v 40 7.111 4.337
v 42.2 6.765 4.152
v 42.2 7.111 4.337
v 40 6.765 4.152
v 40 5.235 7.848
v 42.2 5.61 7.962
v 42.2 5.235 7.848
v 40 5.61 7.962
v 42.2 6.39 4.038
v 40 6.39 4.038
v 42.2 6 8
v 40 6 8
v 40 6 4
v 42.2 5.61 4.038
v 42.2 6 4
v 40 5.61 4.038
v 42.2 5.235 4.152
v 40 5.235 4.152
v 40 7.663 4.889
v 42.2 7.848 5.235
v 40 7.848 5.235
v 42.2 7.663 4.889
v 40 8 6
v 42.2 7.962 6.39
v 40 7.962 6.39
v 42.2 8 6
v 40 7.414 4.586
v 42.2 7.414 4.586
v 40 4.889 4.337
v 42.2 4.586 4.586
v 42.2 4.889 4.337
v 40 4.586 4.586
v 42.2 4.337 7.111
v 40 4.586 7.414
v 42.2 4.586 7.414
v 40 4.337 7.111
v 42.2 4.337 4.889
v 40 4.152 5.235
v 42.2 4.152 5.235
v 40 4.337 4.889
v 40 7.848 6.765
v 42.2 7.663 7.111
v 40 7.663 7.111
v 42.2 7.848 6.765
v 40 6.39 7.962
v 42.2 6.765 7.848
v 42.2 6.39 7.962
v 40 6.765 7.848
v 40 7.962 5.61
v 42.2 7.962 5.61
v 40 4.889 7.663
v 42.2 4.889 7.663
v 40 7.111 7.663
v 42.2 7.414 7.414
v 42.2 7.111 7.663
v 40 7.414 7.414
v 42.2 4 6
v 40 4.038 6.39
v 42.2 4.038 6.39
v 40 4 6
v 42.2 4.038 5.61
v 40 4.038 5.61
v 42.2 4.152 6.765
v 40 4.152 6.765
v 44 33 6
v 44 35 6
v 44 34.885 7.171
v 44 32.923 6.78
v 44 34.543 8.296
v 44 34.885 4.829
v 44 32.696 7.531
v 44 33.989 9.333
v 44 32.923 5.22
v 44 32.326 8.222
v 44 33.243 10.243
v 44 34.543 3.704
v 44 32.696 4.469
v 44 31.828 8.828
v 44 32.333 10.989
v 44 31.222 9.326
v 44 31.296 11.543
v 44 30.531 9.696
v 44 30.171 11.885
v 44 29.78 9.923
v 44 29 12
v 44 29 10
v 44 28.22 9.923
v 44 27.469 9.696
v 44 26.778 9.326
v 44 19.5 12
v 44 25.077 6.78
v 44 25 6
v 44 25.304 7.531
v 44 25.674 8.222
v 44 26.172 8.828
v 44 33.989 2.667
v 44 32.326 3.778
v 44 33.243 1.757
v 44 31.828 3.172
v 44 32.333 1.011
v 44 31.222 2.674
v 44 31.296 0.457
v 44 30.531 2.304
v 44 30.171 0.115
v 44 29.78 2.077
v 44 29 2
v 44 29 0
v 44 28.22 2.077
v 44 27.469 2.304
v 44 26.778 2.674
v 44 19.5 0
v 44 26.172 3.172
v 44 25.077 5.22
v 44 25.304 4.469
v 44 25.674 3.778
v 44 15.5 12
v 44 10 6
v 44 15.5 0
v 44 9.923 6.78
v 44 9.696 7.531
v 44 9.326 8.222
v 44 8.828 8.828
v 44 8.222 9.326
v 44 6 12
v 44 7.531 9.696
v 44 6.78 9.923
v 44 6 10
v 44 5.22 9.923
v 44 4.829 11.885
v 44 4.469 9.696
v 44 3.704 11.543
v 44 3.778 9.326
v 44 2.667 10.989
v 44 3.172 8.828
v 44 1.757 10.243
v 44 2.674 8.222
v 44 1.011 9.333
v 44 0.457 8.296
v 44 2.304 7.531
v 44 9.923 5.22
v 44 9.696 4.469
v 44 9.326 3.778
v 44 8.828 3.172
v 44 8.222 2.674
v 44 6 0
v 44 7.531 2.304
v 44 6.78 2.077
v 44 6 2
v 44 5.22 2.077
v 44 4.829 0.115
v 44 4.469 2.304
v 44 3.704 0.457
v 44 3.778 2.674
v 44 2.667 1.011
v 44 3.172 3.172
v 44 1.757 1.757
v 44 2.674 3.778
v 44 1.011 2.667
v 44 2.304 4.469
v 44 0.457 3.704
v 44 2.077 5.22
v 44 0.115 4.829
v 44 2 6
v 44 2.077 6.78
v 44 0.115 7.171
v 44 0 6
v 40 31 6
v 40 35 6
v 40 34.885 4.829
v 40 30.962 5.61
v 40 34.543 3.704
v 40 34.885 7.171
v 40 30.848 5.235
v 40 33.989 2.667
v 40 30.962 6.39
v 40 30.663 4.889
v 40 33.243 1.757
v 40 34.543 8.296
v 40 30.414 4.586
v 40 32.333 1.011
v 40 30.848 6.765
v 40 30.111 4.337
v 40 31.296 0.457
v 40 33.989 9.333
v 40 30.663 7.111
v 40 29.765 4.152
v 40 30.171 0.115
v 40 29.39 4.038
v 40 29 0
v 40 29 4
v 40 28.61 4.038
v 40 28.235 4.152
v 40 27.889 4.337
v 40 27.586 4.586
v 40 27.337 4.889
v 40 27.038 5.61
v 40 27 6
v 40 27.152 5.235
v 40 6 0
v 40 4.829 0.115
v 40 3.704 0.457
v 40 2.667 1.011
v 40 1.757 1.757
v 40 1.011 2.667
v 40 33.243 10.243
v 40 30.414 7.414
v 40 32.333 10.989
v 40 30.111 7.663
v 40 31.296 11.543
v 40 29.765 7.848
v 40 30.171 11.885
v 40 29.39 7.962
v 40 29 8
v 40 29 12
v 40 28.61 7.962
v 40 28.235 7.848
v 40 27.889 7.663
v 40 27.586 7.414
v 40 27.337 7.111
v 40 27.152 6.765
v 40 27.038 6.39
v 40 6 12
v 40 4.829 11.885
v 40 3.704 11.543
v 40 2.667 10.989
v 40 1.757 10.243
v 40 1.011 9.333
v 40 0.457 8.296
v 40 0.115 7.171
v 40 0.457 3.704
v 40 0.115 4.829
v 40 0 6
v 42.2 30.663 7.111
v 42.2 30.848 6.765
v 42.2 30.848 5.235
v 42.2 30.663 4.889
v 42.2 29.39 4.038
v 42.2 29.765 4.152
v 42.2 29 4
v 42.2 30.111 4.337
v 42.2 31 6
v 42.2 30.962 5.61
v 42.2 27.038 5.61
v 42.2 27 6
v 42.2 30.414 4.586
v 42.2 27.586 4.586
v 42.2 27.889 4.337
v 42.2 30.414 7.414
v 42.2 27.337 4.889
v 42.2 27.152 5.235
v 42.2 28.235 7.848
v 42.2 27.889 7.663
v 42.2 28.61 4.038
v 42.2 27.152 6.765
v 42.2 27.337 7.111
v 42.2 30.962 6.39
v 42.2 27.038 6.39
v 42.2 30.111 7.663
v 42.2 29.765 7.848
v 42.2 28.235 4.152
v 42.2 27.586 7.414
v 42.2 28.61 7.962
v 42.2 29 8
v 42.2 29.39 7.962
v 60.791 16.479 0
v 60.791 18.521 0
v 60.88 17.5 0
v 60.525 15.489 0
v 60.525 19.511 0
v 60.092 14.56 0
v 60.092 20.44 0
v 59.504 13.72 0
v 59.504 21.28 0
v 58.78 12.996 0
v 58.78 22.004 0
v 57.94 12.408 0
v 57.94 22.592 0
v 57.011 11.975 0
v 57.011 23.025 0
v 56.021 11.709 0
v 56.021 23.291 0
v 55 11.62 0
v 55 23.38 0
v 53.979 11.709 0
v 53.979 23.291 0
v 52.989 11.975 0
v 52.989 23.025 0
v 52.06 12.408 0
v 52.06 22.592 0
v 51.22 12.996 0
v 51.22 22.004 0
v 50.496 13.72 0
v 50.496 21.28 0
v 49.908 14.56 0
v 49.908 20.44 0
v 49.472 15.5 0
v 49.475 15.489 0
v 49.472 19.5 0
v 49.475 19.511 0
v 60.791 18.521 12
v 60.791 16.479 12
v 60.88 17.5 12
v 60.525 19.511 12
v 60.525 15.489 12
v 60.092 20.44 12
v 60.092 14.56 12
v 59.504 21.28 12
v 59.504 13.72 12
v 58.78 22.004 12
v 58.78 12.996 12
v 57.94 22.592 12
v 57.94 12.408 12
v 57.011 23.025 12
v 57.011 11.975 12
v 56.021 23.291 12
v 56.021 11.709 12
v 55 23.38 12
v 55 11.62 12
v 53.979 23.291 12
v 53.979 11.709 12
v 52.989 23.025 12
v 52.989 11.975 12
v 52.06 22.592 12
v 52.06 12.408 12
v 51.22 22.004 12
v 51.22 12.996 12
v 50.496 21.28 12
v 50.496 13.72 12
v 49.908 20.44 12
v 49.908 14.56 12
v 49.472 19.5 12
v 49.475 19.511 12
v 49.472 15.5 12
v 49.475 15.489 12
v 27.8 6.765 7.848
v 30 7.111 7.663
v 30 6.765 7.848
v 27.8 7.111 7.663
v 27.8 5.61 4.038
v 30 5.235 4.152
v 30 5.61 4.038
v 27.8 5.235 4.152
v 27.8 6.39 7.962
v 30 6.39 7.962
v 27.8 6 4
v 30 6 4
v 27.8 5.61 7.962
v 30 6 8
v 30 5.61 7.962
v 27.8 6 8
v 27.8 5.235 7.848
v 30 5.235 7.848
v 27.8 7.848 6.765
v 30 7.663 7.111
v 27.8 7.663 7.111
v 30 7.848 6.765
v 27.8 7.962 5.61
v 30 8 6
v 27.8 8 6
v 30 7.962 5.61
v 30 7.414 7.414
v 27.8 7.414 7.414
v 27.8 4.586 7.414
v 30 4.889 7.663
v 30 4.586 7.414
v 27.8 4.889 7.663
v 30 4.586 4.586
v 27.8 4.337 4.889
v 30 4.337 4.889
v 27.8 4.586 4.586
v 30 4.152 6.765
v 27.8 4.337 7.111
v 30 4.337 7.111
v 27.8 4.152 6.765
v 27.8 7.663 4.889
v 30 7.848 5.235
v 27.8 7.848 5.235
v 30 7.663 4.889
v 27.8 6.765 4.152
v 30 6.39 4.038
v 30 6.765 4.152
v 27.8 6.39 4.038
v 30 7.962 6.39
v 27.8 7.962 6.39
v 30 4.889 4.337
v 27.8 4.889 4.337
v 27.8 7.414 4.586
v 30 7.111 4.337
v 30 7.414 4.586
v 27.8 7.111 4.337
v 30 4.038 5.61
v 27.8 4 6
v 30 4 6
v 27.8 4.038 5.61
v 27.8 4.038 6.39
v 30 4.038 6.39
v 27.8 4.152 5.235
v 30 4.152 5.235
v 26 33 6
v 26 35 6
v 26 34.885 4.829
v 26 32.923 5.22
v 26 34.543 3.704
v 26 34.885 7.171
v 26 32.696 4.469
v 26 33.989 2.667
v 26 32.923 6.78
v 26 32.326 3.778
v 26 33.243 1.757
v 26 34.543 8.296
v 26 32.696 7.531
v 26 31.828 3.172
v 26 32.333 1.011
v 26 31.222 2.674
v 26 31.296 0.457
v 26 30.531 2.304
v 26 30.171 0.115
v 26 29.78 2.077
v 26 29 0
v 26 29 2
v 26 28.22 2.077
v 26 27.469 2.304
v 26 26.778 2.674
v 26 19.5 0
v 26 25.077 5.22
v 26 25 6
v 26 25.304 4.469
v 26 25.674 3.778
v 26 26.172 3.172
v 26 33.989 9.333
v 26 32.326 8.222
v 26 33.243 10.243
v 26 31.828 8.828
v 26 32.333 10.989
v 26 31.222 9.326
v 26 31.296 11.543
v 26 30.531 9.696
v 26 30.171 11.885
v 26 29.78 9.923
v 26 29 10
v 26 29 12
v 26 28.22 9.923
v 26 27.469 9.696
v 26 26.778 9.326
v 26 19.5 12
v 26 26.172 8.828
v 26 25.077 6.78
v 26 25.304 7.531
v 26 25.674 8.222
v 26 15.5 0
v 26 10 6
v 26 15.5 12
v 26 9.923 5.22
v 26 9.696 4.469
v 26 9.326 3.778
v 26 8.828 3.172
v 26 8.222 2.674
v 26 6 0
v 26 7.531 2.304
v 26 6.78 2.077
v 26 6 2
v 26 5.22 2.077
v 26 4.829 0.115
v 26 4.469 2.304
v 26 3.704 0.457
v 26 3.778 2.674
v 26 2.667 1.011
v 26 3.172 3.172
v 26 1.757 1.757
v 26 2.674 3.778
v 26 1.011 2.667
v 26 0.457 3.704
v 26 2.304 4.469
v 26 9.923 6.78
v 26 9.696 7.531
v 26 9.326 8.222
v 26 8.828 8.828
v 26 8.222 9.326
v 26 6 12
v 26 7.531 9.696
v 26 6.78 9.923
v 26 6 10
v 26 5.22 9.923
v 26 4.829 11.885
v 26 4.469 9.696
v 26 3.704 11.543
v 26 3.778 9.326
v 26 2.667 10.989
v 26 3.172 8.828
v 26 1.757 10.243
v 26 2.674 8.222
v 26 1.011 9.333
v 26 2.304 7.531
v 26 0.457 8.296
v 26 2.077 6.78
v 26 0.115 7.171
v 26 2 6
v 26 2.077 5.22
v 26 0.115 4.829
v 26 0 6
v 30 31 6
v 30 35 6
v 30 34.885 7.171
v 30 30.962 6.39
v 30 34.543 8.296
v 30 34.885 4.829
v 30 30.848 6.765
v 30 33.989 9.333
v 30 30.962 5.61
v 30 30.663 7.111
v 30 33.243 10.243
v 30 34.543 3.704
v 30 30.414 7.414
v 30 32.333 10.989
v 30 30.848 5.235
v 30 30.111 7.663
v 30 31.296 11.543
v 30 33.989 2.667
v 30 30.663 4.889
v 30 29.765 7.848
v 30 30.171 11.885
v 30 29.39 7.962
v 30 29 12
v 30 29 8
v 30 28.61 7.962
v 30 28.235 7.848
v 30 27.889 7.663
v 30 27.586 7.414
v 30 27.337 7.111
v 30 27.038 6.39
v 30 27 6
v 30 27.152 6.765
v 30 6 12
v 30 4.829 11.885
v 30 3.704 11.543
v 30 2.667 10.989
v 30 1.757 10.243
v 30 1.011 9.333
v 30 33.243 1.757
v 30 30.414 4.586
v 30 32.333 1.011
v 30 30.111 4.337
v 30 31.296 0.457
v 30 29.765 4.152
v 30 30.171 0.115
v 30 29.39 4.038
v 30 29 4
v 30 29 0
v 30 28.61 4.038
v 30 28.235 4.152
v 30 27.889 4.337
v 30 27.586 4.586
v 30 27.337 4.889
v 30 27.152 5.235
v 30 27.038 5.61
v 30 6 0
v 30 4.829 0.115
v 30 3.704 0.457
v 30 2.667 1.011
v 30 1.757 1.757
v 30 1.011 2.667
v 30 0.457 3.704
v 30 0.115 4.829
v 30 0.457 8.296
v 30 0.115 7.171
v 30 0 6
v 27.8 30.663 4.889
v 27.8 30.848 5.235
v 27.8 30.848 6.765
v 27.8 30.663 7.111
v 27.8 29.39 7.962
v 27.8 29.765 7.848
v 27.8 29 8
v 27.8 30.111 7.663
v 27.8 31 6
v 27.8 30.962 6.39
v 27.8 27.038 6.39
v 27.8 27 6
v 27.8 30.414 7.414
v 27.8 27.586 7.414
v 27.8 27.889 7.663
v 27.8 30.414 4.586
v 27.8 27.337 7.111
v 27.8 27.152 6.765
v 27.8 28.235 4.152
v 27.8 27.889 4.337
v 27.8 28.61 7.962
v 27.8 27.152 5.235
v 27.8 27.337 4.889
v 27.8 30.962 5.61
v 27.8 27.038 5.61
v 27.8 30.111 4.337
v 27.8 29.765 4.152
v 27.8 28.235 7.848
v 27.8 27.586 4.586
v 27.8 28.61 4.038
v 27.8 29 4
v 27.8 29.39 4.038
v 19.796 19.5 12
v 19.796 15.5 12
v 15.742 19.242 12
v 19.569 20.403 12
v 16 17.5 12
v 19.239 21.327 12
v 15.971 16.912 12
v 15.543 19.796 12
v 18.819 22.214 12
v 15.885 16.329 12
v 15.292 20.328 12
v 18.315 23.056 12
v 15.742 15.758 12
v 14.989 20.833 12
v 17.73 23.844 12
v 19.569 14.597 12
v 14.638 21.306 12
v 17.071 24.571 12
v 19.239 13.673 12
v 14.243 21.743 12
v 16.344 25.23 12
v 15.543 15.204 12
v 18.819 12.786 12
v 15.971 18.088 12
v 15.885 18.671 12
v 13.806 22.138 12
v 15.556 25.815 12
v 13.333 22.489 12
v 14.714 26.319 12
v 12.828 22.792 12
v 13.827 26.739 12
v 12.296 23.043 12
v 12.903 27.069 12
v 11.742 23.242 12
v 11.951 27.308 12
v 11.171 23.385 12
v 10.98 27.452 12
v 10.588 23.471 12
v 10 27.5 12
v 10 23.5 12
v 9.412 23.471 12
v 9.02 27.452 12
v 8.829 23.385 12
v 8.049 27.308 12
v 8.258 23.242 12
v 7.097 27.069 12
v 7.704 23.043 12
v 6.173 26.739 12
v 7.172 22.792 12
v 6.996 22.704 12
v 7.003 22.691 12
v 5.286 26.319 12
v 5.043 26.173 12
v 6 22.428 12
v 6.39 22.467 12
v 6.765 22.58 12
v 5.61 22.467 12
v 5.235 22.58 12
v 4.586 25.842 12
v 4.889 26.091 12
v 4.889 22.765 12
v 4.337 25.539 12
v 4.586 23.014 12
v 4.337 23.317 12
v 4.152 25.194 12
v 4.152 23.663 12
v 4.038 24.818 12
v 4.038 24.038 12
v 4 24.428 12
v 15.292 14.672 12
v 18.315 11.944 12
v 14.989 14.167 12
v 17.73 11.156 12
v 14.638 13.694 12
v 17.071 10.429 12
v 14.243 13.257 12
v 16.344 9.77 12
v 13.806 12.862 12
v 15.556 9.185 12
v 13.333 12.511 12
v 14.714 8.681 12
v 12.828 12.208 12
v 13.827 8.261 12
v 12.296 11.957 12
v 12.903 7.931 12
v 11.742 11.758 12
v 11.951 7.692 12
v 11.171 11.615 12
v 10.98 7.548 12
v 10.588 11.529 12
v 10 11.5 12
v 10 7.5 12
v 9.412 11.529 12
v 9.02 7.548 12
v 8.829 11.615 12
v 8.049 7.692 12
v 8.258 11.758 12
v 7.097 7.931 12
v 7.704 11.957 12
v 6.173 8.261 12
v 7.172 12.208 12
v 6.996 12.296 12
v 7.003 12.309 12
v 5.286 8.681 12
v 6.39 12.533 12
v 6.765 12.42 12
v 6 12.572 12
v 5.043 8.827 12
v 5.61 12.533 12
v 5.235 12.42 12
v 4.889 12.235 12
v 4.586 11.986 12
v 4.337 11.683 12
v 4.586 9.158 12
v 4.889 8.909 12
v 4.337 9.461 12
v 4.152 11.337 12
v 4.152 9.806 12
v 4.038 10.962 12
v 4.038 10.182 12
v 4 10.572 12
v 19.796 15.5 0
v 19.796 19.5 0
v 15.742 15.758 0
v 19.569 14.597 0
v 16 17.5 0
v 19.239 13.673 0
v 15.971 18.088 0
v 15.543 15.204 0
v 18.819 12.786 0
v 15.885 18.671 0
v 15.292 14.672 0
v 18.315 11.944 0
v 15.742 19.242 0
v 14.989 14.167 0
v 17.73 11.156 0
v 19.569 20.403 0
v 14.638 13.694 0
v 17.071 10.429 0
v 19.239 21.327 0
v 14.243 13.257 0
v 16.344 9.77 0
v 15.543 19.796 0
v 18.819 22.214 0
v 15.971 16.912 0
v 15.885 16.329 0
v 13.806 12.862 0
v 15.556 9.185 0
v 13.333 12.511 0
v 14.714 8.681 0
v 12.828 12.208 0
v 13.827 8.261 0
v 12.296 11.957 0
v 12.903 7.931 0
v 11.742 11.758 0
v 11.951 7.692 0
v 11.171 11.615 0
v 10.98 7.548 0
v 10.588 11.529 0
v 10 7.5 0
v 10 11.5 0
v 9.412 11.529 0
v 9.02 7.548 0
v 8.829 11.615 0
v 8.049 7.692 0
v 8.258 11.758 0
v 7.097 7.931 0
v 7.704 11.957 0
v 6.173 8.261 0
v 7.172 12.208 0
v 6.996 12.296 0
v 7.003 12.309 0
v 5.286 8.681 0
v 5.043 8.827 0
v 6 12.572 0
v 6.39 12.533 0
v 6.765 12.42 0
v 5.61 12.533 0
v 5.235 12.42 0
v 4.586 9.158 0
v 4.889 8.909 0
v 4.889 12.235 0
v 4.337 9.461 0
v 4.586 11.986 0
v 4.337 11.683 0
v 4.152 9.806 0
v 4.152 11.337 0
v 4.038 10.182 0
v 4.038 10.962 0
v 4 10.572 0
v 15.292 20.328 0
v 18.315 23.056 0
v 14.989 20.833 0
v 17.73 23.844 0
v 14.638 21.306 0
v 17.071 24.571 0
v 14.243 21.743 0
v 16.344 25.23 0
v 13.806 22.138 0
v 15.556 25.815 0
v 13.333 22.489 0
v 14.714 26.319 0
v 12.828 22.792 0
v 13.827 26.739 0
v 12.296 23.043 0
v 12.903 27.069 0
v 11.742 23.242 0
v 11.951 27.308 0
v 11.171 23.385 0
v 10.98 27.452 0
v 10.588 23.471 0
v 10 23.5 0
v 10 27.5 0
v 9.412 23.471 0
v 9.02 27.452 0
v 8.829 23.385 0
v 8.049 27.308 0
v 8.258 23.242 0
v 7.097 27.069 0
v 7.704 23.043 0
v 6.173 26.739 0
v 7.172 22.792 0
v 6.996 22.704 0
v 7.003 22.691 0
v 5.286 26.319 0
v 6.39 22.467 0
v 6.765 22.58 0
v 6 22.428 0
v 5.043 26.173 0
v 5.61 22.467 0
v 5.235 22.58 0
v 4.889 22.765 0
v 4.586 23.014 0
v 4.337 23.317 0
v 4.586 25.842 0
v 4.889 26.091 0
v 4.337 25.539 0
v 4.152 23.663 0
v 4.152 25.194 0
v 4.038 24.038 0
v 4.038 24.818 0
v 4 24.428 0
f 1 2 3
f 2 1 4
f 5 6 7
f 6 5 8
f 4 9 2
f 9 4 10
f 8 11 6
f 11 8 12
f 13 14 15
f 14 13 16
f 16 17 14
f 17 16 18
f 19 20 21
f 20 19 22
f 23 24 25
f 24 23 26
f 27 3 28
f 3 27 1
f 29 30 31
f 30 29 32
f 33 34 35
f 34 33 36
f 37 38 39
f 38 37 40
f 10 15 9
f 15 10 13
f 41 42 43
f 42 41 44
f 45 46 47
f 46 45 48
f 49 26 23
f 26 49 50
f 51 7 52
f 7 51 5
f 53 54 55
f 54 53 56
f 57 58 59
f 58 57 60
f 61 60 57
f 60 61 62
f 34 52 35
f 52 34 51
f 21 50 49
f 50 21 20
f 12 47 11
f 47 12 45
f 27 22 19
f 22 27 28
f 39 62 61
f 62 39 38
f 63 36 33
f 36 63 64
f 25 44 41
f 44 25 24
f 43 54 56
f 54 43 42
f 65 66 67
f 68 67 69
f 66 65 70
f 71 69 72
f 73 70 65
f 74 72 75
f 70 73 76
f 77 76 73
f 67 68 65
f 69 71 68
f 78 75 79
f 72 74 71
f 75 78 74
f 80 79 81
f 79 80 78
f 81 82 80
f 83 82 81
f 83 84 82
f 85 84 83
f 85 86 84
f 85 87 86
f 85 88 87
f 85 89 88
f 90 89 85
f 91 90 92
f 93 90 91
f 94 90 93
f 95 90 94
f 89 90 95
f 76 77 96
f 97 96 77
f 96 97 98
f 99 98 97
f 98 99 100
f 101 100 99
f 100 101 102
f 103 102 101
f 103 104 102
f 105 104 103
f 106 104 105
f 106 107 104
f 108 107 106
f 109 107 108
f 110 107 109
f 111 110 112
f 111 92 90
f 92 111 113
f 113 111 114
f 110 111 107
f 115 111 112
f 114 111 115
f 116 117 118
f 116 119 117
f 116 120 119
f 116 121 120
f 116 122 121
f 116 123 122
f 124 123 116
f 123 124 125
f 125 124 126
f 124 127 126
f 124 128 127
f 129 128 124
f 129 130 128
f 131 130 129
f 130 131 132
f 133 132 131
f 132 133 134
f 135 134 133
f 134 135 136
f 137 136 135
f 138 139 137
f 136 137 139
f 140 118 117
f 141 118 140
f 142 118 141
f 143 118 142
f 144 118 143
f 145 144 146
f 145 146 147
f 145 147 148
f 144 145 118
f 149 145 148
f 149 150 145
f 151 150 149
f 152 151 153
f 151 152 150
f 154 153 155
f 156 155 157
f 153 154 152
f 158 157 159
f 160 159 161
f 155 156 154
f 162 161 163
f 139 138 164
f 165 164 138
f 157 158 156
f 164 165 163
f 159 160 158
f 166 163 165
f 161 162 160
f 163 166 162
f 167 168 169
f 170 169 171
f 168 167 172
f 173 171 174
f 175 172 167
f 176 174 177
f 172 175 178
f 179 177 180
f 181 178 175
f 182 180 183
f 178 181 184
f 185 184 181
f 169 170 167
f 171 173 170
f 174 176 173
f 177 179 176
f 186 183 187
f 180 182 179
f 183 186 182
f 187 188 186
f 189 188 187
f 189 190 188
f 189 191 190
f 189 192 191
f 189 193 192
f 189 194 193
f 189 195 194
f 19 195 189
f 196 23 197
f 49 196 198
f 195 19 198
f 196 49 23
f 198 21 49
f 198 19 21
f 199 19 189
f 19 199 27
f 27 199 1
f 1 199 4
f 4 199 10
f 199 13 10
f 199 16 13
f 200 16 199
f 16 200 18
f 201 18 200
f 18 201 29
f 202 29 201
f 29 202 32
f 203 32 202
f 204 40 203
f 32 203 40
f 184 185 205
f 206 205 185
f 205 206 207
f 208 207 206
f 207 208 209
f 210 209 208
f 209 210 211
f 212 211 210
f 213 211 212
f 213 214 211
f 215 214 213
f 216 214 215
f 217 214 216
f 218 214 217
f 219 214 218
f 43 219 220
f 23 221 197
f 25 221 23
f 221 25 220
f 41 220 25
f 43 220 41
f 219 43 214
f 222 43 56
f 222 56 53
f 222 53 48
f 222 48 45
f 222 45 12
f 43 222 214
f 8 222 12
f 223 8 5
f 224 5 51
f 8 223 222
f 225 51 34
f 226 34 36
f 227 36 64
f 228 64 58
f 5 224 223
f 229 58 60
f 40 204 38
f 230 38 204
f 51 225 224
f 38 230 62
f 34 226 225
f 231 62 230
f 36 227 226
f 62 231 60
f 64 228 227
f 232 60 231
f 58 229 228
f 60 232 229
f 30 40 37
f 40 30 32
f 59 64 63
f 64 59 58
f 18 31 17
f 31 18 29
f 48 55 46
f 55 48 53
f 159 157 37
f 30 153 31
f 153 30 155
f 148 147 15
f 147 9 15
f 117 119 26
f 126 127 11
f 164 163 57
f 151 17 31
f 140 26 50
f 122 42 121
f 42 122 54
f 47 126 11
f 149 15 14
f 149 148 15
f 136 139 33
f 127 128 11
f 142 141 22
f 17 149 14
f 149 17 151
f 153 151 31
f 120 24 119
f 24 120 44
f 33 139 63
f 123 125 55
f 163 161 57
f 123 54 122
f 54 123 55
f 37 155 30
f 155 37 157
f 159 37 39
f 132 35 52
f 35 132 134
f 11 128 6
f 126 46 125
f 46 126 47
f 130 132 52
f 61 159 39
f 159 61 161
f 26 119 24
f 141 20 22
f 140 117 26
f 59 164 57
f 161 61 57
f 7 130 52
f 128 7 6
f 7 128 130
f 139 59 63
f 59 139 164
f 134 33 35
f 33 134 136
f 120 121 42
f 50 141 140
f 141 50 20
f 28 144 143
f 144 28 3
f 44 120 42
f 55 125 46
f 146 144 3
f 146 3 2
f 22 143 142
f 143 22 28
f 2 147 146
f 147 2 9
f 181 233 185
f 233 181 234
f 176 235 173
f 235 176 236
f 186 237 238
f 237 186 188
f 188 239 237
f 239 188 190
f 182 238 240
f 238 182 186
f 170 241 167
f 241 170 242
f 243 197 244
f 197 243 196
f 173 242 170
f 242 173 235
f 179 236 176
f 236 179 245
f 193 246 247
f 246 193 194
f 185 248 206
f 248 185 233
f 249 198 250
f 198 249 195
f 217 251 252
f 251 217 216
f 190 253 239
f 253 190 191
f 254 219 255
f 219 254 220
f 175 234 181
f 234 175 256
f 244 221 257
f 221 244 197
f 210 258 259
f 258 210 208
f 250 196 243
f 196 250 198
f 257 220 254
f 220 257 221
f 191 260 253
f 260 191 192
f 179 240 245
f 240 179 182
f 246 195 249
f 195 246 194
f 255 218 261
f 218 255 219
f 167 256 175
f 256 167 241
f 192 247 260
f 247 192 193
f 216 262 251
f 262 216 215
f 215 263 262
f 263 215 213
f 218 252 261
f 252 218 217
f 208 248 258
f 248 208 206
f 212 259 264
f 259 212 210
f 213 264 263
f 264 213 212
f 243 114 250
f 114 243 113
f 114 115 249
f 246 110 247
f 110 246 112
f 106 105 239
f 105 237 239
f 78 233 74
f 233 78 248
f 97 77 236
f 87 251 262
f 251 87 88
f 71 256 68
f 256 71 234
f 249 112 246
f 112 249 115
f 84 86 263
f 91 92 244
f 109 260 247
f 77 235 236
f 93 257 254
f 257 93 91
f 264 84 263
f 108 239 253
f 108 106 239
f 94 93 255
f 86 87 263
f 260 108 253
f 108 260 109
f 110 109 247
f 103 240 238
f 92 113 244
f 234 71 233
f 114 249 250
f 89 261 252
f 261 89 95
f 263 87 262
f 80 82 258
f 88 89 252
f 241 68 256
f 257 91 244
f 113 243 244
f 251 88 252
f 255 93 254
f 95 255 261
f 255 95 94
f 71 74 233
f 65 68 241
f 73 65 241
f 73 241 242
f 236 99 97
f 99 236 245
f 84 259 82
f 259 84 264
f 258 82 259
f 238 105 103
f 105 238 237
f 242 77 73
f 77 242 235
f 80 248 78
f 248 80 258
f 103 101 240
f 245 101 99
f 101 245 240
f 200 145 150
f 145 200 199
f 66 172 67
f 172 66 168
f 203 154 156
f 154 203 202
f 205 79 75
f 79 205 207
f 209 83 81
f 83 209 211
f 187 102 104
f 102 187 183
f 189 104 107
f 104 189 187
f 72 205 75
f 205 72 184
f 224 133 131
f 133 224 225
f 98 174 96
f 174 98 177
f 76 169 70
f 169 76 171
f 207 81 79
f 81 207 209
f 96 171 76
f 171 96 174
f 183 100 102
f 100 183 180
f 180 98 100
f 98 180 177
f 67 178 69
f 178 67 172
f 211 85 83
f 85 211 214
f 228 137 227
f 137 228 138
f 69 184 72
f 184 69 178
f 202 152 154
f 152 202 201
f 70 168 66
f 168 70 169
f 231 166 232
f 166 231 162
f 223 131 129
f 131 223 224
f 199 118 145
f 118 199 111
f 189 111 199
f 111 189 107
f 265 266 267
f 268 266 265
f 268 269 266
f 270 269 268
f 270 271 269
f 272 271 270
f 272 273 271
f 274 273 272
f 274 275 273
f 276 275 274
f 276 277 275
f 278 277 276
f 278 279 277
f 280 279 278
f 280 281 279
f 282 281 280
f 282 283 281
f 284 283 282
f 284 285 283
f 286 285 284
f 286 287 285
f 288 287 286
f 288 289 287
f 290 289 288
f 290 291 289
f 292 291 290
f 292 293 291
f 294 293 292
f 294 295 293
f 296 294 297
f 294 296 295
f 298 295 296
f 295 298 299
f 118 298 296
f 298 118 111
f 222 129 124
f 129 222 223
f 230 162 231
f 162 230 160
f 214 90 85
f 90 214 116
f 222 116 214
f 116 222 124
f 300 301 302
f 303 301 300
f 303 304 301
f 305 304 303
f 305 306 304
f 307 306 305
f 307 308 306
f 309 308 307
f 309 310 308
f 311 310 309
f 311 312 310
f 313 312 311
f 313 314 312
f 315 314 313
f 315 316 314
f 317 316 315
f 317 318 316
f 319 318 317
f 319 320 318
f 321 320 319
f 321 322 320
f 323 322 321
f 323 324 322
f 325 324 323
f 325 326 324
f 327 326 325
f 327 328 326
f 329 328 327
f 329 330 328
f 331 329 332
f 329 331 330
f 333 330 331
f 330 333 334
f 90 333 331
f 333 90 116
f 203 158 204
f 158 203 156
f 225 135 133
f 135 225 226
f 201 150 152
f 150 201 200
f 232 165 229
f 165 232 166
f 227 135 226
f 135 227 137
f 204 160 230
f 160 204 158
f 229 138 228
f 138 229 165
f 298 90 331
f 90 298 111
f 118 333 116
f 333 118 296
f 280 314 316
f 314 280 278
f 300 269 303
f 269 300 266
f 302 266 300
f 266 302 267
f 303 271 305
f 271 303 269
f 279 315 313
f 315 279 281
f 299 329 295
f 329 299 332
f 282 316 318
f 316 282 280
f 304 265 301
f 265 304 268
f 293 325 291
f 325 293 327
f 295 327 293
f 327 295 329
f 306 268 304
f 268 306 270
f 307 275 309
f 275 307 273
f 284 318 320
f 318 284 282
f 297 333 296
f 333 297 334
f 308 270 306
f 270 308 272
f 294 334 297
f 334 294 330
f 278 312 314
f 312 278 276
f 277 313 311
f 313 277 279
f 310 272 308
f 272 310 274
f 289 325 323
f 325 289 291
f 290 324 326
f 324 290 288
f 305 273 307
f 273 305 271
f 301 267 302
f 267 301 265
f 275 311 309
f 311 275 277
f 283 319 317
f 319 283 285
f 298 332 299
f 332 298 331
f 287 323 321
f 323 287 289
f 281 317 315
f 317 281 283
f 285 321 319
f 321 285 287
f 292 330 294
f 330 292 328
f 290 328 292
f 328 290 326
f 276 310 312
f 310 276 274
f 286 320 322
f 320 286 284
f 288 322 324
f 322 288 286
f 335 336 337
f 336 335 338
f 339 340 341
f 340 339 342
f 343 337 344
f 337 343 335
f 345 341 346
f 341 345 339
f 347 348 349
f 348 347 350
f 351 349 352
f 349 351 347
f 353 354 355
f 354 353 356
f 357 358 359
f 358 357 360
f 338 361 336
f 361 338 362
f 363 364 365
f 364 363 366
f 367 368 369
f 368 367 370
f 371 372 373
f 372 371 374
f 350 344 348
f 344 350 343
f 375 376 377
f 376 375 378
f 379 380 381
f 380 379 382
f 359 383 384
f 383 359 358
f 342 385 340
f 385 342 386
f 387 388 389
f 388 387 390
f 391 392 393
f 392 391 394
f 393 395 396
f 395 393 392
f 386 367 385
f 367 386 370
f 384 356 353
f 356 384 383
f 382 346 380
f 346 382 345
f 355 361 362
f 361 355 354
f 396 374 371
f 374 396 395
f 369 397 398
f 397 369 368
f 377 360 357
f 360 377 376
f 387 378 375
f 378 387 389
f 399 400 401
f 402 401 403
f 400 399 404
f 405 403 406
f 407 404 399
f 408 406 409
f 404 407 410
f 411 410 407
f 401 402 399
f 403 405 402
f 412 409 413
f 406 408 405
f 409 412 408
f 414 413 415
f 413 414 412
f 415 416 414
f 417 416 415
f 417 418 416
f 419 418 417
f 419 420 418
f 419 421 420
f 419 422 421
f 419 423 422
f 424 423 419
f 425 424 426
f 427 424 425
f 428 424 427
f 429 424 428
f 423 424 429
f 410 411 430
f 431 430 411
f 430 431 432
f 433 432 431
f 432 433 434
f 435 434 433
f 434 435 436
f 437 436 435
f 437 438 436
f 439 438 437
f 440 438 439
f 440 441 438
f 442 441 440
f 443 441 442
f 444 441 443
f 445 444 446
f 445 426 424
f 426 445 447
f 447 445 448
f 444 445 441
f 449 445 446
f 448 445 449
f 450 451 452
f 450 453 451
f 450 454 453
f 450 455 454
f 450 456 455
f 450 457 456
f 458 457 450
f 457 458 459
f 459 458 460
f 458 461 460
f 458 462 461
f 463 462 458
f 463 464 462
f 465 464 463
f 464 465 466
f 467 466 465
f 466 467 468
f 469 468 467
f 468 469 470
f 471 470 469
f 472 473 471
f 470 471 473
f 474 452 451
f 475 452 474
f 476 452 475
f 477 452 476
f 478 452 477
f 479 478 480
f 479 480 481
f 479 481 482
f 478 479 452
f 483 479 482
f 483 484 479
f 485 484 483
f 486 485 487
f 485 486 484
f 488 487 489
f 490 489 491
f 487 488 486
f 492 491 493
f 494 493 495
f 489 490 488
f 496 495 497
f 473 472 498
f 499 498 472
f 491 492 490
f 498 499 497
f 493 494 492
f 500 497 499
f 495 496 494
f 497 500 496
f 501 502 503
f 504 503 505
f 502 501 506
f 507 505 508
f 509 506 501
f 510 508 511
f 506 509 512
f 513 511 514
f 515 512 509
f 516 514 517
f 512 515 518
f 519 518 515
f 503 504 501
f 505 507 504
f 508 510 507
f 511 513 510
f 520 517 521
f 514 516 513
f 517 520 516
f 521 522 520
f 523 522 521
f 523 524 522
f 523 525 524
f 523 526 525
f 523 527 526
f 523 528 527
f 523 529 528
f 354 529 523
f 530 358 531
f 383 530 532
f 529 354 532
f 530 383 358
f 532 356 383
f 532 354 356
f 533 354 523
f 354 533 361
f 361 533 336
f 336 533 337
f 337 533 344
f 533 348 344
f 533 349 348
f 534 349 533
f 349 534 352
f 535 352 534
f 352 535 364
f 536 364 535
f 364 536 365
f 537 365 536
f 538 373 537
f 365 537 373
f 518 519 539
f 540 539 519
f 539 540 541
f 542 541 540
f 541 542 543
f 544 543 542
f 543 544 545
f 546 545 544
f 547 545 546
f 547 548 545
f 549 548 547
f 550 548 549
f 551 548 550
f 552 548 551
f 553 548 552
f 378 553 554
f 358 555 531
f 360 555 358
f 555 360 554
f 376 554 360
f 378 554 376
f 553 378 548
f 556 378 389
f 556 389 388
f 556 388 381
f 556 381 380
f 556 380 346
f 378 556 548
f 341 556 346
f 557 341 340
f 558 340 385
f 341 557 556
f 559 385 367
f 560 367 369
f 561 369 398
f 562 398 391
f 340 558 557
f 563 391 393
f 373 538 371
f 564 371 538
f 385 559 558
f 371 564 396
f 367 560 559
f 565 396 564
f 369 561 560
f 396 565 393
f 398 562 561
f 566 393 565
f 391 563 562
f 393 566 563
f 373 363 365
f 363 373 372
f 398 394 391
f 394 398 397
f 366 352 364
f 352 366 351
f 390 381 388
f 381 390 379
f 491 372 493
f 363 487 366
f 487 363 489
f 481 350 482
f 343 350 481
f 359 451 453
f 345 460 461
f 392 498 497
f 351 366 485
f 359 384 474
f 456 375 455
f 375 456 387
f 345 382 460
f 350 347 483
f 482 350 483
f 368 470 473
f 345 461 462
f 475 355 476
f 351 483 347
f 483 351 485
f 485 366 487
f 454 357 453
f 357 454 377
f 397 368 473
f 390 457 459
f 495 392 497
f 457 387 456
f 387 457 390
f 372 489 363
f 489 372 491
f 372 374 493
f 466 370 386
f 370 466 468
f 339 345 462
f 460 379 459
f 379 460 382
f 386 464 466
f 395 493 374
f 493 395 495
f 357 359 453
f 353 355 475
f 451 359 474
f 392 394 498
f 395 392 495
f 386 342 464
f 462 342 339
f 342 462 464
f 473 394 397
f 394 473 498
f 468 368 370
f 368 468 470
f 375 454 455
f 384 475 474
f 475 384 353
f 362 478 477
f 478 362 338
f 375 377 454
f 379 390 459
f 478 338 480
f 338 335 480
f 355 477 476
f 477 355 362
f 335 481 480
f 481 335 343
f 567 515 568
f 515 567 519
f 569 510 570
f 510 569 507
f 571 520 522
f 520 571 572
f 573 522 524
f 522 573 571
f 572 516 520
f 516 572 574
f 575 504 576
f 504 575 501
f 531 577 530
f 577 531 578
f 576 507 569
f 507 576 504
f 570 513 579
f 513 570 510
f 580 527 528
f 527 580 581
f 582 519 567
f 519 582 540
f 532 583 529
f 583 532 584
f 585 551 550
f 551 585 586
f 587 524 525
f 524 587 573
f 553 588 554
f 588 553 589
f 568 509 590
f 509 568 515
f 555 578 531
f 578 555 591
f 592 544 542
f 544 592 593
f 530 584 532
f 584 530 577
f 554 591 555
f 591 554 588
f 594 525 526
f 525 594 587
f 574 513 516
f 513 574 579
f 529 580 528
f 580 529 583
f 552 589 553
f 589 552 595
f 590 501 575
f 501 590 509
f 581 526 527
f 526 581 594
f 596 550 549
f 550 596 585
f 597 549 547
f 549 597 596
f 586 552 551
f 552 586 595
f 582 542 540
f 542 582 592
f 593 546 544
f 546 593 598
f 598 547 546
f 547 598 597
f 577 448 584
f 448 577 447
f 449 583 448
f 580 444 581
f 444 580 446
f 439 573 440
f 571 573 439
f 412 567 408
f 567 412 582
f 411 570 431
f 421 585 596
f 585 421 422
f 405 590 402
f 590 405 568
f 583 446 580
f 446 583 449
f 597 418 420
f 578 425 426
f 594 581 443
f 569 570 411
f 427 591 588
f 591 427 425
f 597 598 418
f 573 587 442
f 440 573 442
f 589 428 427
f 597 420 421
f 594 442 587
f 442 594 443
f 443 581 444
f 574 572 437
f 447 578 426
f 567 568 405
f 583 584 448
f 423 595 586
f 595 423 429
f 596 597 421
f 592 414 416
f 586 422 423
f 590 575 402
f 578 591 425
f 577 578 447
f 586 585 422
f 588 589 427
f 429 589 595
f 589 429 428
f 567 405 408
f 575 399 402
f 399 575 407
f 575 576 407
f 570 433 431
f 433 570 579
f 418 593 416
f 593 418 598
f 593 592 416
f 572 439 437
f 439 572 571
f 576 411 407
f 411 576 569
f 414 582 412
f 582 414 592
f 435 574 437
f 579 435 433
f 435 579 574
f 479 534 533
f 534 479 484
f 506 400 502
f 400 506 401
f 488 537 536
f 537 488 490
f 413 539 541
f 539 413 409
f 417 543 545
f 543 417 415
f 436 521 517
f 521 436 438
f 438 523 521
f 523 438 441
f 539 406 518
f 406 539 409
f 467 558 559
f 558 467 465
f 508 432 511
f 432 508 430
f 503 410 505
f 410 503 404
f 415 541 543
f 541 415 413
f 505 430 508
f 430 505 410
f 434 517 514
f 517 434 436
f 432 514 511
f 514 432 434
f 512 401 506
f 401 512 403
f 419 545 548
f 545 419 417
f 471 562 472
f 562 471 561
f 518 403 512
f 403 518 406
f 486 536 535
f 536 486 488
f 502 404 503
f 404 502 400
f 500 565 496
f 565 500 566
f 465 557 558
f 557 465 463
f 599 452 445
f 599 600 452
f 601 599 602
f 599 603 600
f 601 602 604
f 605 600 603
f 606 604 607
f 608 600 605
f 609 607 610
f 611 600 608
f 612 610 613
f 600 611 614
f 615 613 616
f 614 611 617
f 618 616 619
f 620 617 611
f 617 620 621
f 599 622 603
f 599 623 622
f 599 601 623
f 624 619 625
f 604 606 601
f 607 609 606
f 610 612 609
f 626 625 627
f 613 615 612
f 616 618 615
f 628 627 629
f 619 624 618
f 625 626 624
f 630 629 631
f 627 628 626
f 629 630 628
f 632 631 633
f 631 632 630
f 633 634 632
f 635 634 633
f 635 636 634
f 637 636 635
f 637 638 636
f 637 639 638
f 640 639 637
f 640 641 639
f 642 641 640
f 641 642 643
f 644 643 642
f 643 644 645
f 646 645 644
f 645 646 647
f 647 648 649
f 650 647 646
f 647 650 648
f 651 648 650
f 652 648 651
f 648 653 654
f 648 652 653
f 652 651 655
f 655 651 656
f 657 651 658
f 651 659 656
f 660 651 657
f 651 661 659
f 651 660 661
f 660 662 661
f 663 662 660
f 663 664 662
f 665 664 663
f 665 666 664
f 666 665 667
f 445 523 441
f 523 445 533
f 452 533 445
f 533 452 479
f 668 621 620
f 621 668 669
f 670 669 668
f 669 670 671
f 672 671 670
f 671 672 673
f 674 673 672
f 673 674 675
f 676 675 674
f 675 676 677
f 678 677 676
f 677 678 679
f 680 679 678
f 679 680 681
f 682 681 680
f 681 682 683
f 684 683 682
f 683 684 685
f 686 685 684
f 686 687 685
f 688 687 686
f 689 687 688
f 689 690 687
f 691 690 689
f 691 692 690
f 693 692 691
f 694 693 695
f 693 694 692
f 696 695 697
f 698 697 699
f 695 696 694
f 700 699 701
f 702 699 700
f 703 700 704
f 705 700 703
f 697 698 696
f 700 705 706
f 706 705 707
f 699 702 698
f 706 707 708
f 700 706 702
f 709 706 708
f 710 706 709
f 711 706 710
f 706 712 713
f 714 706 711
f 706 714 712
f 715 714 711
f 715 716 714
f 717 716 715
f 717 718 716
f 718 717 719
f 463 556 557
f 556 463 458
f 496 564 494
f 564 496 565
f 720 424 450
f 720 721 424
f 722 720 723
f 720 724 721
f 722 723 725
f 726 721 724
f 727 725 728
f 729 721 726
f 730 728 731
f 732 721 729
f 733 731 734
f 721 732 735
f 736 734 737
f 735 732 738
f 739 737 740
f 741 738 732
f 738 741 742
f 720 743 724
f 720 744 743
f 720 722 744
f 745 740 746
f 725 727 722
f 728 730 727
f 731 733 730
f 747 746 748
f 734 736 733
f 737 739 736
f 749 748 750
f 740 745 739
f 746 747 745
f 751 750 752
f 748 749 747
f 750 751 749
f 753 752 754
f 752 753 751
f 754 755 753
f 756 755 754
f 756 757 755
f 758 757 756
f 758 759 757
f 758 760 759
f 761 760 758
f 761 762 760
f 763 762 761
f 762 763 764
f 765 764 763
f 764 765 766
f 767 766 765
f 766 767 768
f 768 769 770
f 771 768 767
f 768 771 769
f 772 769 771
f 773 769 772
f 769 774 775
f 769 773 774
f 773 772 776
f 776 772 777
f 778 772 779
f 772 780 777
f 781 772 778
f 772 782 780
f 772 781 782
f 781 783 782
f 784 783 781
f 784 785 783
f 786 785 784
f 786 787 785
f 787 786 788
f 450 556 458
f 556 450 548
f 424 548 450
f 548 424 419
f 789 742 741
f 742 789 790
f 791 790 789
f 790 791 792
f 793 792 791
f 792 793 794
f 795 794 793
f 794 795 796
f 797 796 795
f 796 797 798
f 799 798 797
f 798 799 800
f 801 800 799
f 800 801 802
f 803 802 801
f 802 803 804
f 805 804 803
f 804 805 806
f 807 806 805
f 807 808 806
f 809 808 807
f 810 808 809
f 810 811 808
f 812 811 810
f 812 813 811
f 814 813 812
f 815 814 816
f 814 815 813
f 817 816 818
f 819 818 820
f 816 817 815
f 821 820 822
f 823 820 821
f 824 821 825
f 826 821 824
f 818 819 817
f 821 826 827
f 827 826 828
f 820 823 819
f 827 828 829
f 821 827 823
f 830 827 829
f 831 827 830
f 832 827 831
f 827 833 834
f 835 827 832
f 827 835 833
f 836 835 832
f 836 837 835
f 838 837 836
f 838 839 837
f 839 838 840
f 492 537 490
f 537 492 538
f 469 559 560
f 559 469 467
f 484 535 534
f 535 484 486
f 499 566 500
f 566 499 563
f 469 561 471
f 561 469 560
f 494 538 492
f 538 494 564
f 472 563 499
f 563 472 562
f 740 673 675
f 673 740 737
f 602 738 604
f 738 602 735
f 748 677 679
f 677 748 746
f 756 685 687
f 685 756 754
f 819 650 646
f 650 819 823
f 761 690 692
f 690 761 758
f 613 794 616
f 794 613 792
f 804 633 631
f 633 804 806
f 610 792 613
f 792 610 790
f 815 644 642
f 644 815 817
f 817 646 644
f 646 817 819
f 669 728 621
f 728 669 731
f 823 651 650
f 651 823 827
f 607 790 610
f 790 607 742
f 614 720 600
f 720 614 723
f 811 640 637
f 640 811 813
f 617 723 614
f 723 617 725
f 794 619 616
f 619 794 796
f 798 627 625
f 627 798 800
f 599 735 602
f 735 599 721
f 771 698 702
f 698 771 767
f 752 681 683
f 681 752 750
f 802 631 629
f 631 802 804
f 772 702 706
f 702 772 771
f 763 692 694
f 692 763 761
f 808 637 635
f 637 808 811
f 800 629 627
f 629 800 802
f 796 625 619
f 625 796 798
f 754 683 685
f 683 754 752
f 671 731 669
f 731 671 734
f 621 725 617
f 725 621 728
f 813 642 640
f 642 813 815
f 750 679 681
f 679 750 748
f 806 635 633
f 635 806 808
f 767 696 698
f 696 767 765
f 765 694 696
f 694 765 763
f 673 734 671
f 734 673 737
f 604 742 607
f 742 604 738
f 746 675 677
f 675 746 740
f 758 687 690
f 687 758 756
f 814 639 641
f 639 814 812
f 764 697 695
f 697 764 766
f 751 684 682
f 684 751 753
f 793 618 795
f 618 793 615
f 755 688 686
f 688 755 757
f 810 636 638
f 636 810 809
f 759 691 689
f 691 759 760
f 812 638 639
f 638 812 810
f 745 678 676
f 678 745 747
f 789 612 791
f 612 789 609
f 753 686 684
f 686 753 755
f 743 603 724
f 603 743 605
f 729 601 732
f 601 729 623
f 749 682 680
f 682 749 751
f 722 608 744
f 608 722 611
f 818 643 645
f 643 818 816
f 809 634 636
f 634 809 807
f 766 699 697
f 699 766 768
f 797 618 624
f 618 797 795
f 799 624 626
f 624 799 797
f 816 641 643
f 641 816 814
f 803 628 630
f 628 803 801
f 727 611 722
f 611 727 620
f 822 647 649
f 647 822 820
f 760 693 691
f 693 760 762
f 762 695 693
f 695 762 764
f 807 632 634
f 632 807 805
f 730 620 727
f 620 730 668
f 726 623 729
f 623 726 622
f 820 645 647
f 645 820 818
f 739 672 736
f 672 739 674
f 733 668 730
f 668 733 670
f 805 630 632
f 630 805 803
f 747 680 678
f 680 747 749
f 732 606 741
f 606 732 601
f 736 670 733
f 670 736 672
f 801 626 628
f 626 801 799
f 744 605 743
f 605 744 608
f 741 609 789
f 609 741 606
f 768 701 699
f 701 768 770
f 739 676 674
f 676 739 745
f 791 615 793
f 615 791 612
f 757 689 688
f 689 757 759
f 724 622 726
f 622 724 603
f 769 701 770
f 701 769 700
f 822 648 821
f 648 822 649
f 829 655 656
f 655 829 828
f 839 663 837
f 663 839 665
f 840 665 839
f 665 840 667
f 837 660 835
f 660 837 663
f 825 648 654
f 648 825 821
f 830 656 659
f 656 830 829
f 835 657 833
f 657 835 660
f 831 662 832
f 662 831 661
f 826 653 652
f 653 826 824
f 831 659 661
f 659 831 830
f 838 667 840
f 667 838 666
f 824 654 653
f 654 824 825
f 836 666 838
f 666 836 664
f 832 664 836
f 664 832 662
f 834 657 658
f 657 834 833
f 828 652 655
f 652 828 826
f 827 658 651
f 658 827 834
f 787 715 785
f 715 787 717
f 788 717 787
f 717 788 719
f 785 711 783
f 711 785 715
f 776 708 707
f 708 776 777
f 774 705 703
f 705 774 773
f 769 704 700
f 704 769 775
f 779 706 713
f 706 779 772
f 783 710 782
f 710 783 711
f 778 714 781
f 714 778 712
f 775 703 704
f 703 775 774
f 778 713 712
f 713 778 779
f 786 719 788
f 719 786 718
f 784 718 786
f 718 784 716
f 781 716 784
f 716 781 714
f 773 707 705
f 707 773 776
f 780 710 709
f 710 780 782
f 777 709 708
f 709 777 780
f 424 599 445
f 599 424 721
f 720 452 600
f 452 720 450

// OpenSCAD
/*---------------------------------------------------------
Parametric Door Catch.
Design by Jon Frosdick em: jon@bee53.com on 05-Mar-2019.

licenced under Creative Commons :
Attribution-NonCommercial-ShareAlike 4.0 International (CC BY-NC-SA 4.0)
http://creativecommons.org/licenses/by-nc-sa/4.0/

Remixed from: https://www.thingiverse.com/thing:891278  by Worlds6440

Basic Instructions - OpenSCAD:
1. The parameters below can be adjusted, though not all need to be.
2. make any required changes then hit F5 to view the model.
3. Press F6 to render and then export to STL.
4. Slice in your favourite software and print.

Note: There is no error checking so you need to use commnon-sense when changing parameters. For example
 there is nothing stopping you from entering screw hole diameters larger than the wall plate width except
 your own good judgement. Or hell, go for it just for the giggles...

v1.01 - updated Tolerance variable to accpet whole numbers - Customizer compatibility issue.
v1.0 - First upload 05-Mar-2019
---------------------------------------------------------*/
//CUSTOMIZER VARIABLES
//these most likely should be changed

//Show pieces together? "true" = see how tolerances look, "false" = ready to print
ShowTogether = "false"; //[true,false]

//The diameter of the ball.
BallD = 12; //[3:25]

//The tolerance in % between the ball and the socket (higher numbers = looser) - note: makes ball smaller, not the socket larger.
Tolerance = 2; //[0:5]

//Rounded or square wall plate. "true" = rounded corners, "false" = square corners.
WPRounded = "true"; //[true,false]

//The height the wall plate extends from door when fitted in mm.
WPThickness = 4; //[1.5:8.0]

//The width of the wall plate in mm.
WPWidth = 12; //[5:25]

//The length of the wall plate in mm.
WPLength = 35; //[10:90]

//The diameter of the screw hole in mm.
ScrewD = 4; //[0:7.5]

//The depth in mm of the screw countersink (must be smaller than thickness).
ScrewCS = 1.8; //[0:3.0]

//How many times bigger the top of the countersink section is than the screw hole diameter.
ScrewCSFactor = 2; //[1.0:3.0]

//The thickness of the arm part in mm.
ArmThickness = 4; //[1.0:10.0]

//The thickness of the socket in mm.
SocketThickness = 4; //[1.0:10.0]

//The distance from door to centre of ball socket in mm (Note: StandoffF + StandoffM = Total length of the two connected pieces.)
StandoffF = 20; //[5:75]

//The distance from wall to centre of ball in mm (Note: StandoffF + StandoffM = Total length of the two connected pieces.)
StandoffM = 15; //[5:75]

//the portion of the socket that is removed in degrees. Note the rounded edges are added back on after so resultant gap is always smaller than this.
GapAngle = 120; //[100:145]
//CUSTOMIZER VARIABLES END
//---------------------------------------------------------------------------------------
//You should not need to make any changes below this line.




makeLayout();




//Assemble pieces and display accordingly
module makeLayout(){   
    if (ShowTogether == "true"){
        makeMale();
        translate([StandoffF+StandoffM, 0, WPWidth])
        rotate([0, 180, 0])
        makeFemale();
    } else {
        translate([StandoffF+10+BallD/2+SocketThickness,0,0])
        makeMale();
        translate([StandoffF+BallD/2+SocketThickness, 0 , WPWidth])
        rotate([0, 180, 0])
        makeFemale();
    }
}



module makeMale(){
    translate([0, WPWidth/2,WPWidth/2])
    rotate([0,90,0])
    makeWallPlate();
    
    translate([StandoffM/2, WPLength/2,WPWidth/2])
    makeArm(StandoffM, ArmThickness, WPWidth);
    
    translate([StandoffM, WPLength/2,0])
    makeBall();
   
}


module makeFemale(){
    union(){
        translate([0, WPWidth/2,WPWidth/2])
        rotate([0,90,0])
        makeWallPlate();
        
        translate([WPThickness+(StandoffF-BallD)/2, WPLength/2,WPWidth/2])
        makeArm(StandoffF-BallD, ArmThickness, WPWidth);
        
        translate([StandoffF, WPLength/2,0])
        makeSocket();
    }
}


module makeWallPlate(){
    difference(){
        if (WPRounded == "true") { //rounded corners
            hull(){
                translate([0, WPLength-WPWidth, 0])
                linear_extrude(WPThickness)
                circle(d=WPWidth, $fn=32);
                
                translate([0, 0, 0])
                linear_extrude(WPThickness)
                circle(d=WPWidth, $fn=32);
            }
        } else { //square corners   
            hull(){
                translate([0, WPLength-WPWidth, 0])
                linear_extrude(WPThickness)
                square(WPWidth, center=true);
                
                translate([0, 0, 0])
                linear_extrude(WPThickness)
                square(WPWidth, center=true);
            }
        }
        makeCountersunkScrewhole(WPThickness, ScrewD, ScrewCS, ScrewCSFactor);
        
        translate([0, WPLength-WPWidth, 0])
        makeCountersunkScrewhole(WPThickness, ScrewD, ScrewCS, ScrewCSFactor);
    }
}


module makeCountersunkScrewhole(Z=10, D=4, CSZ=4, CSF=2, FN=32){
    cylinder(Z, d=D, $fn=FN); //screwhole
    translate([0,0,Z-CSZ])
    cylinder(CSZ, d1=D, d2=(D*CSF),$fn=FN); //countersink
}


module makeArm(X, Y, Z){
    //TODO maybe add strength here later if needed
    cube([X, Y, Z], center=true);
}


module makeSocket(){
    union(){
        difference(){
            //Outer cylinder
            cylinder(WPWidth, d=BallD+SocketThickness*2, $fn=64);
            
            //Subtract
            //Inner cylinder
            cylinder(WPWidth, d=BallD, $fn=64);
            
            //and the Wedge
            linear_extrude(WPWidth)
            polygon([[0,0],[5*(BallD+SocketThickness)*cos(GapAngle/2), 5*(BallD+SocketThickness)*sin(GapAngle/2)] ,[5*(BallD+SocketThickness)*cos(GapAngle/2), -5*(BallD+SocketThickness)*sin(GapAngle/2)]]); 
        }
    }
    translate([(BallD+SocketThickness)/2*cos(GapAngle/2), (BallD+SocketThickness)/2*sin(GapAngle/2),0])
    cylinder(WPWidth, d=SocketThickness, $fn=32);
    
    translate([(BallD+SocketThickness)/2*cos(GapAngle/2), -(BallD+SocketThickness)/2*sin(GapAngle/2),0])
    cylinder(WPWidth, d=SocketThickness, $fn=32);
}


module makeBall(){
    cylinder(WPWidth, d=BallD*(1-Tolerance/100), $fn=36);
}
